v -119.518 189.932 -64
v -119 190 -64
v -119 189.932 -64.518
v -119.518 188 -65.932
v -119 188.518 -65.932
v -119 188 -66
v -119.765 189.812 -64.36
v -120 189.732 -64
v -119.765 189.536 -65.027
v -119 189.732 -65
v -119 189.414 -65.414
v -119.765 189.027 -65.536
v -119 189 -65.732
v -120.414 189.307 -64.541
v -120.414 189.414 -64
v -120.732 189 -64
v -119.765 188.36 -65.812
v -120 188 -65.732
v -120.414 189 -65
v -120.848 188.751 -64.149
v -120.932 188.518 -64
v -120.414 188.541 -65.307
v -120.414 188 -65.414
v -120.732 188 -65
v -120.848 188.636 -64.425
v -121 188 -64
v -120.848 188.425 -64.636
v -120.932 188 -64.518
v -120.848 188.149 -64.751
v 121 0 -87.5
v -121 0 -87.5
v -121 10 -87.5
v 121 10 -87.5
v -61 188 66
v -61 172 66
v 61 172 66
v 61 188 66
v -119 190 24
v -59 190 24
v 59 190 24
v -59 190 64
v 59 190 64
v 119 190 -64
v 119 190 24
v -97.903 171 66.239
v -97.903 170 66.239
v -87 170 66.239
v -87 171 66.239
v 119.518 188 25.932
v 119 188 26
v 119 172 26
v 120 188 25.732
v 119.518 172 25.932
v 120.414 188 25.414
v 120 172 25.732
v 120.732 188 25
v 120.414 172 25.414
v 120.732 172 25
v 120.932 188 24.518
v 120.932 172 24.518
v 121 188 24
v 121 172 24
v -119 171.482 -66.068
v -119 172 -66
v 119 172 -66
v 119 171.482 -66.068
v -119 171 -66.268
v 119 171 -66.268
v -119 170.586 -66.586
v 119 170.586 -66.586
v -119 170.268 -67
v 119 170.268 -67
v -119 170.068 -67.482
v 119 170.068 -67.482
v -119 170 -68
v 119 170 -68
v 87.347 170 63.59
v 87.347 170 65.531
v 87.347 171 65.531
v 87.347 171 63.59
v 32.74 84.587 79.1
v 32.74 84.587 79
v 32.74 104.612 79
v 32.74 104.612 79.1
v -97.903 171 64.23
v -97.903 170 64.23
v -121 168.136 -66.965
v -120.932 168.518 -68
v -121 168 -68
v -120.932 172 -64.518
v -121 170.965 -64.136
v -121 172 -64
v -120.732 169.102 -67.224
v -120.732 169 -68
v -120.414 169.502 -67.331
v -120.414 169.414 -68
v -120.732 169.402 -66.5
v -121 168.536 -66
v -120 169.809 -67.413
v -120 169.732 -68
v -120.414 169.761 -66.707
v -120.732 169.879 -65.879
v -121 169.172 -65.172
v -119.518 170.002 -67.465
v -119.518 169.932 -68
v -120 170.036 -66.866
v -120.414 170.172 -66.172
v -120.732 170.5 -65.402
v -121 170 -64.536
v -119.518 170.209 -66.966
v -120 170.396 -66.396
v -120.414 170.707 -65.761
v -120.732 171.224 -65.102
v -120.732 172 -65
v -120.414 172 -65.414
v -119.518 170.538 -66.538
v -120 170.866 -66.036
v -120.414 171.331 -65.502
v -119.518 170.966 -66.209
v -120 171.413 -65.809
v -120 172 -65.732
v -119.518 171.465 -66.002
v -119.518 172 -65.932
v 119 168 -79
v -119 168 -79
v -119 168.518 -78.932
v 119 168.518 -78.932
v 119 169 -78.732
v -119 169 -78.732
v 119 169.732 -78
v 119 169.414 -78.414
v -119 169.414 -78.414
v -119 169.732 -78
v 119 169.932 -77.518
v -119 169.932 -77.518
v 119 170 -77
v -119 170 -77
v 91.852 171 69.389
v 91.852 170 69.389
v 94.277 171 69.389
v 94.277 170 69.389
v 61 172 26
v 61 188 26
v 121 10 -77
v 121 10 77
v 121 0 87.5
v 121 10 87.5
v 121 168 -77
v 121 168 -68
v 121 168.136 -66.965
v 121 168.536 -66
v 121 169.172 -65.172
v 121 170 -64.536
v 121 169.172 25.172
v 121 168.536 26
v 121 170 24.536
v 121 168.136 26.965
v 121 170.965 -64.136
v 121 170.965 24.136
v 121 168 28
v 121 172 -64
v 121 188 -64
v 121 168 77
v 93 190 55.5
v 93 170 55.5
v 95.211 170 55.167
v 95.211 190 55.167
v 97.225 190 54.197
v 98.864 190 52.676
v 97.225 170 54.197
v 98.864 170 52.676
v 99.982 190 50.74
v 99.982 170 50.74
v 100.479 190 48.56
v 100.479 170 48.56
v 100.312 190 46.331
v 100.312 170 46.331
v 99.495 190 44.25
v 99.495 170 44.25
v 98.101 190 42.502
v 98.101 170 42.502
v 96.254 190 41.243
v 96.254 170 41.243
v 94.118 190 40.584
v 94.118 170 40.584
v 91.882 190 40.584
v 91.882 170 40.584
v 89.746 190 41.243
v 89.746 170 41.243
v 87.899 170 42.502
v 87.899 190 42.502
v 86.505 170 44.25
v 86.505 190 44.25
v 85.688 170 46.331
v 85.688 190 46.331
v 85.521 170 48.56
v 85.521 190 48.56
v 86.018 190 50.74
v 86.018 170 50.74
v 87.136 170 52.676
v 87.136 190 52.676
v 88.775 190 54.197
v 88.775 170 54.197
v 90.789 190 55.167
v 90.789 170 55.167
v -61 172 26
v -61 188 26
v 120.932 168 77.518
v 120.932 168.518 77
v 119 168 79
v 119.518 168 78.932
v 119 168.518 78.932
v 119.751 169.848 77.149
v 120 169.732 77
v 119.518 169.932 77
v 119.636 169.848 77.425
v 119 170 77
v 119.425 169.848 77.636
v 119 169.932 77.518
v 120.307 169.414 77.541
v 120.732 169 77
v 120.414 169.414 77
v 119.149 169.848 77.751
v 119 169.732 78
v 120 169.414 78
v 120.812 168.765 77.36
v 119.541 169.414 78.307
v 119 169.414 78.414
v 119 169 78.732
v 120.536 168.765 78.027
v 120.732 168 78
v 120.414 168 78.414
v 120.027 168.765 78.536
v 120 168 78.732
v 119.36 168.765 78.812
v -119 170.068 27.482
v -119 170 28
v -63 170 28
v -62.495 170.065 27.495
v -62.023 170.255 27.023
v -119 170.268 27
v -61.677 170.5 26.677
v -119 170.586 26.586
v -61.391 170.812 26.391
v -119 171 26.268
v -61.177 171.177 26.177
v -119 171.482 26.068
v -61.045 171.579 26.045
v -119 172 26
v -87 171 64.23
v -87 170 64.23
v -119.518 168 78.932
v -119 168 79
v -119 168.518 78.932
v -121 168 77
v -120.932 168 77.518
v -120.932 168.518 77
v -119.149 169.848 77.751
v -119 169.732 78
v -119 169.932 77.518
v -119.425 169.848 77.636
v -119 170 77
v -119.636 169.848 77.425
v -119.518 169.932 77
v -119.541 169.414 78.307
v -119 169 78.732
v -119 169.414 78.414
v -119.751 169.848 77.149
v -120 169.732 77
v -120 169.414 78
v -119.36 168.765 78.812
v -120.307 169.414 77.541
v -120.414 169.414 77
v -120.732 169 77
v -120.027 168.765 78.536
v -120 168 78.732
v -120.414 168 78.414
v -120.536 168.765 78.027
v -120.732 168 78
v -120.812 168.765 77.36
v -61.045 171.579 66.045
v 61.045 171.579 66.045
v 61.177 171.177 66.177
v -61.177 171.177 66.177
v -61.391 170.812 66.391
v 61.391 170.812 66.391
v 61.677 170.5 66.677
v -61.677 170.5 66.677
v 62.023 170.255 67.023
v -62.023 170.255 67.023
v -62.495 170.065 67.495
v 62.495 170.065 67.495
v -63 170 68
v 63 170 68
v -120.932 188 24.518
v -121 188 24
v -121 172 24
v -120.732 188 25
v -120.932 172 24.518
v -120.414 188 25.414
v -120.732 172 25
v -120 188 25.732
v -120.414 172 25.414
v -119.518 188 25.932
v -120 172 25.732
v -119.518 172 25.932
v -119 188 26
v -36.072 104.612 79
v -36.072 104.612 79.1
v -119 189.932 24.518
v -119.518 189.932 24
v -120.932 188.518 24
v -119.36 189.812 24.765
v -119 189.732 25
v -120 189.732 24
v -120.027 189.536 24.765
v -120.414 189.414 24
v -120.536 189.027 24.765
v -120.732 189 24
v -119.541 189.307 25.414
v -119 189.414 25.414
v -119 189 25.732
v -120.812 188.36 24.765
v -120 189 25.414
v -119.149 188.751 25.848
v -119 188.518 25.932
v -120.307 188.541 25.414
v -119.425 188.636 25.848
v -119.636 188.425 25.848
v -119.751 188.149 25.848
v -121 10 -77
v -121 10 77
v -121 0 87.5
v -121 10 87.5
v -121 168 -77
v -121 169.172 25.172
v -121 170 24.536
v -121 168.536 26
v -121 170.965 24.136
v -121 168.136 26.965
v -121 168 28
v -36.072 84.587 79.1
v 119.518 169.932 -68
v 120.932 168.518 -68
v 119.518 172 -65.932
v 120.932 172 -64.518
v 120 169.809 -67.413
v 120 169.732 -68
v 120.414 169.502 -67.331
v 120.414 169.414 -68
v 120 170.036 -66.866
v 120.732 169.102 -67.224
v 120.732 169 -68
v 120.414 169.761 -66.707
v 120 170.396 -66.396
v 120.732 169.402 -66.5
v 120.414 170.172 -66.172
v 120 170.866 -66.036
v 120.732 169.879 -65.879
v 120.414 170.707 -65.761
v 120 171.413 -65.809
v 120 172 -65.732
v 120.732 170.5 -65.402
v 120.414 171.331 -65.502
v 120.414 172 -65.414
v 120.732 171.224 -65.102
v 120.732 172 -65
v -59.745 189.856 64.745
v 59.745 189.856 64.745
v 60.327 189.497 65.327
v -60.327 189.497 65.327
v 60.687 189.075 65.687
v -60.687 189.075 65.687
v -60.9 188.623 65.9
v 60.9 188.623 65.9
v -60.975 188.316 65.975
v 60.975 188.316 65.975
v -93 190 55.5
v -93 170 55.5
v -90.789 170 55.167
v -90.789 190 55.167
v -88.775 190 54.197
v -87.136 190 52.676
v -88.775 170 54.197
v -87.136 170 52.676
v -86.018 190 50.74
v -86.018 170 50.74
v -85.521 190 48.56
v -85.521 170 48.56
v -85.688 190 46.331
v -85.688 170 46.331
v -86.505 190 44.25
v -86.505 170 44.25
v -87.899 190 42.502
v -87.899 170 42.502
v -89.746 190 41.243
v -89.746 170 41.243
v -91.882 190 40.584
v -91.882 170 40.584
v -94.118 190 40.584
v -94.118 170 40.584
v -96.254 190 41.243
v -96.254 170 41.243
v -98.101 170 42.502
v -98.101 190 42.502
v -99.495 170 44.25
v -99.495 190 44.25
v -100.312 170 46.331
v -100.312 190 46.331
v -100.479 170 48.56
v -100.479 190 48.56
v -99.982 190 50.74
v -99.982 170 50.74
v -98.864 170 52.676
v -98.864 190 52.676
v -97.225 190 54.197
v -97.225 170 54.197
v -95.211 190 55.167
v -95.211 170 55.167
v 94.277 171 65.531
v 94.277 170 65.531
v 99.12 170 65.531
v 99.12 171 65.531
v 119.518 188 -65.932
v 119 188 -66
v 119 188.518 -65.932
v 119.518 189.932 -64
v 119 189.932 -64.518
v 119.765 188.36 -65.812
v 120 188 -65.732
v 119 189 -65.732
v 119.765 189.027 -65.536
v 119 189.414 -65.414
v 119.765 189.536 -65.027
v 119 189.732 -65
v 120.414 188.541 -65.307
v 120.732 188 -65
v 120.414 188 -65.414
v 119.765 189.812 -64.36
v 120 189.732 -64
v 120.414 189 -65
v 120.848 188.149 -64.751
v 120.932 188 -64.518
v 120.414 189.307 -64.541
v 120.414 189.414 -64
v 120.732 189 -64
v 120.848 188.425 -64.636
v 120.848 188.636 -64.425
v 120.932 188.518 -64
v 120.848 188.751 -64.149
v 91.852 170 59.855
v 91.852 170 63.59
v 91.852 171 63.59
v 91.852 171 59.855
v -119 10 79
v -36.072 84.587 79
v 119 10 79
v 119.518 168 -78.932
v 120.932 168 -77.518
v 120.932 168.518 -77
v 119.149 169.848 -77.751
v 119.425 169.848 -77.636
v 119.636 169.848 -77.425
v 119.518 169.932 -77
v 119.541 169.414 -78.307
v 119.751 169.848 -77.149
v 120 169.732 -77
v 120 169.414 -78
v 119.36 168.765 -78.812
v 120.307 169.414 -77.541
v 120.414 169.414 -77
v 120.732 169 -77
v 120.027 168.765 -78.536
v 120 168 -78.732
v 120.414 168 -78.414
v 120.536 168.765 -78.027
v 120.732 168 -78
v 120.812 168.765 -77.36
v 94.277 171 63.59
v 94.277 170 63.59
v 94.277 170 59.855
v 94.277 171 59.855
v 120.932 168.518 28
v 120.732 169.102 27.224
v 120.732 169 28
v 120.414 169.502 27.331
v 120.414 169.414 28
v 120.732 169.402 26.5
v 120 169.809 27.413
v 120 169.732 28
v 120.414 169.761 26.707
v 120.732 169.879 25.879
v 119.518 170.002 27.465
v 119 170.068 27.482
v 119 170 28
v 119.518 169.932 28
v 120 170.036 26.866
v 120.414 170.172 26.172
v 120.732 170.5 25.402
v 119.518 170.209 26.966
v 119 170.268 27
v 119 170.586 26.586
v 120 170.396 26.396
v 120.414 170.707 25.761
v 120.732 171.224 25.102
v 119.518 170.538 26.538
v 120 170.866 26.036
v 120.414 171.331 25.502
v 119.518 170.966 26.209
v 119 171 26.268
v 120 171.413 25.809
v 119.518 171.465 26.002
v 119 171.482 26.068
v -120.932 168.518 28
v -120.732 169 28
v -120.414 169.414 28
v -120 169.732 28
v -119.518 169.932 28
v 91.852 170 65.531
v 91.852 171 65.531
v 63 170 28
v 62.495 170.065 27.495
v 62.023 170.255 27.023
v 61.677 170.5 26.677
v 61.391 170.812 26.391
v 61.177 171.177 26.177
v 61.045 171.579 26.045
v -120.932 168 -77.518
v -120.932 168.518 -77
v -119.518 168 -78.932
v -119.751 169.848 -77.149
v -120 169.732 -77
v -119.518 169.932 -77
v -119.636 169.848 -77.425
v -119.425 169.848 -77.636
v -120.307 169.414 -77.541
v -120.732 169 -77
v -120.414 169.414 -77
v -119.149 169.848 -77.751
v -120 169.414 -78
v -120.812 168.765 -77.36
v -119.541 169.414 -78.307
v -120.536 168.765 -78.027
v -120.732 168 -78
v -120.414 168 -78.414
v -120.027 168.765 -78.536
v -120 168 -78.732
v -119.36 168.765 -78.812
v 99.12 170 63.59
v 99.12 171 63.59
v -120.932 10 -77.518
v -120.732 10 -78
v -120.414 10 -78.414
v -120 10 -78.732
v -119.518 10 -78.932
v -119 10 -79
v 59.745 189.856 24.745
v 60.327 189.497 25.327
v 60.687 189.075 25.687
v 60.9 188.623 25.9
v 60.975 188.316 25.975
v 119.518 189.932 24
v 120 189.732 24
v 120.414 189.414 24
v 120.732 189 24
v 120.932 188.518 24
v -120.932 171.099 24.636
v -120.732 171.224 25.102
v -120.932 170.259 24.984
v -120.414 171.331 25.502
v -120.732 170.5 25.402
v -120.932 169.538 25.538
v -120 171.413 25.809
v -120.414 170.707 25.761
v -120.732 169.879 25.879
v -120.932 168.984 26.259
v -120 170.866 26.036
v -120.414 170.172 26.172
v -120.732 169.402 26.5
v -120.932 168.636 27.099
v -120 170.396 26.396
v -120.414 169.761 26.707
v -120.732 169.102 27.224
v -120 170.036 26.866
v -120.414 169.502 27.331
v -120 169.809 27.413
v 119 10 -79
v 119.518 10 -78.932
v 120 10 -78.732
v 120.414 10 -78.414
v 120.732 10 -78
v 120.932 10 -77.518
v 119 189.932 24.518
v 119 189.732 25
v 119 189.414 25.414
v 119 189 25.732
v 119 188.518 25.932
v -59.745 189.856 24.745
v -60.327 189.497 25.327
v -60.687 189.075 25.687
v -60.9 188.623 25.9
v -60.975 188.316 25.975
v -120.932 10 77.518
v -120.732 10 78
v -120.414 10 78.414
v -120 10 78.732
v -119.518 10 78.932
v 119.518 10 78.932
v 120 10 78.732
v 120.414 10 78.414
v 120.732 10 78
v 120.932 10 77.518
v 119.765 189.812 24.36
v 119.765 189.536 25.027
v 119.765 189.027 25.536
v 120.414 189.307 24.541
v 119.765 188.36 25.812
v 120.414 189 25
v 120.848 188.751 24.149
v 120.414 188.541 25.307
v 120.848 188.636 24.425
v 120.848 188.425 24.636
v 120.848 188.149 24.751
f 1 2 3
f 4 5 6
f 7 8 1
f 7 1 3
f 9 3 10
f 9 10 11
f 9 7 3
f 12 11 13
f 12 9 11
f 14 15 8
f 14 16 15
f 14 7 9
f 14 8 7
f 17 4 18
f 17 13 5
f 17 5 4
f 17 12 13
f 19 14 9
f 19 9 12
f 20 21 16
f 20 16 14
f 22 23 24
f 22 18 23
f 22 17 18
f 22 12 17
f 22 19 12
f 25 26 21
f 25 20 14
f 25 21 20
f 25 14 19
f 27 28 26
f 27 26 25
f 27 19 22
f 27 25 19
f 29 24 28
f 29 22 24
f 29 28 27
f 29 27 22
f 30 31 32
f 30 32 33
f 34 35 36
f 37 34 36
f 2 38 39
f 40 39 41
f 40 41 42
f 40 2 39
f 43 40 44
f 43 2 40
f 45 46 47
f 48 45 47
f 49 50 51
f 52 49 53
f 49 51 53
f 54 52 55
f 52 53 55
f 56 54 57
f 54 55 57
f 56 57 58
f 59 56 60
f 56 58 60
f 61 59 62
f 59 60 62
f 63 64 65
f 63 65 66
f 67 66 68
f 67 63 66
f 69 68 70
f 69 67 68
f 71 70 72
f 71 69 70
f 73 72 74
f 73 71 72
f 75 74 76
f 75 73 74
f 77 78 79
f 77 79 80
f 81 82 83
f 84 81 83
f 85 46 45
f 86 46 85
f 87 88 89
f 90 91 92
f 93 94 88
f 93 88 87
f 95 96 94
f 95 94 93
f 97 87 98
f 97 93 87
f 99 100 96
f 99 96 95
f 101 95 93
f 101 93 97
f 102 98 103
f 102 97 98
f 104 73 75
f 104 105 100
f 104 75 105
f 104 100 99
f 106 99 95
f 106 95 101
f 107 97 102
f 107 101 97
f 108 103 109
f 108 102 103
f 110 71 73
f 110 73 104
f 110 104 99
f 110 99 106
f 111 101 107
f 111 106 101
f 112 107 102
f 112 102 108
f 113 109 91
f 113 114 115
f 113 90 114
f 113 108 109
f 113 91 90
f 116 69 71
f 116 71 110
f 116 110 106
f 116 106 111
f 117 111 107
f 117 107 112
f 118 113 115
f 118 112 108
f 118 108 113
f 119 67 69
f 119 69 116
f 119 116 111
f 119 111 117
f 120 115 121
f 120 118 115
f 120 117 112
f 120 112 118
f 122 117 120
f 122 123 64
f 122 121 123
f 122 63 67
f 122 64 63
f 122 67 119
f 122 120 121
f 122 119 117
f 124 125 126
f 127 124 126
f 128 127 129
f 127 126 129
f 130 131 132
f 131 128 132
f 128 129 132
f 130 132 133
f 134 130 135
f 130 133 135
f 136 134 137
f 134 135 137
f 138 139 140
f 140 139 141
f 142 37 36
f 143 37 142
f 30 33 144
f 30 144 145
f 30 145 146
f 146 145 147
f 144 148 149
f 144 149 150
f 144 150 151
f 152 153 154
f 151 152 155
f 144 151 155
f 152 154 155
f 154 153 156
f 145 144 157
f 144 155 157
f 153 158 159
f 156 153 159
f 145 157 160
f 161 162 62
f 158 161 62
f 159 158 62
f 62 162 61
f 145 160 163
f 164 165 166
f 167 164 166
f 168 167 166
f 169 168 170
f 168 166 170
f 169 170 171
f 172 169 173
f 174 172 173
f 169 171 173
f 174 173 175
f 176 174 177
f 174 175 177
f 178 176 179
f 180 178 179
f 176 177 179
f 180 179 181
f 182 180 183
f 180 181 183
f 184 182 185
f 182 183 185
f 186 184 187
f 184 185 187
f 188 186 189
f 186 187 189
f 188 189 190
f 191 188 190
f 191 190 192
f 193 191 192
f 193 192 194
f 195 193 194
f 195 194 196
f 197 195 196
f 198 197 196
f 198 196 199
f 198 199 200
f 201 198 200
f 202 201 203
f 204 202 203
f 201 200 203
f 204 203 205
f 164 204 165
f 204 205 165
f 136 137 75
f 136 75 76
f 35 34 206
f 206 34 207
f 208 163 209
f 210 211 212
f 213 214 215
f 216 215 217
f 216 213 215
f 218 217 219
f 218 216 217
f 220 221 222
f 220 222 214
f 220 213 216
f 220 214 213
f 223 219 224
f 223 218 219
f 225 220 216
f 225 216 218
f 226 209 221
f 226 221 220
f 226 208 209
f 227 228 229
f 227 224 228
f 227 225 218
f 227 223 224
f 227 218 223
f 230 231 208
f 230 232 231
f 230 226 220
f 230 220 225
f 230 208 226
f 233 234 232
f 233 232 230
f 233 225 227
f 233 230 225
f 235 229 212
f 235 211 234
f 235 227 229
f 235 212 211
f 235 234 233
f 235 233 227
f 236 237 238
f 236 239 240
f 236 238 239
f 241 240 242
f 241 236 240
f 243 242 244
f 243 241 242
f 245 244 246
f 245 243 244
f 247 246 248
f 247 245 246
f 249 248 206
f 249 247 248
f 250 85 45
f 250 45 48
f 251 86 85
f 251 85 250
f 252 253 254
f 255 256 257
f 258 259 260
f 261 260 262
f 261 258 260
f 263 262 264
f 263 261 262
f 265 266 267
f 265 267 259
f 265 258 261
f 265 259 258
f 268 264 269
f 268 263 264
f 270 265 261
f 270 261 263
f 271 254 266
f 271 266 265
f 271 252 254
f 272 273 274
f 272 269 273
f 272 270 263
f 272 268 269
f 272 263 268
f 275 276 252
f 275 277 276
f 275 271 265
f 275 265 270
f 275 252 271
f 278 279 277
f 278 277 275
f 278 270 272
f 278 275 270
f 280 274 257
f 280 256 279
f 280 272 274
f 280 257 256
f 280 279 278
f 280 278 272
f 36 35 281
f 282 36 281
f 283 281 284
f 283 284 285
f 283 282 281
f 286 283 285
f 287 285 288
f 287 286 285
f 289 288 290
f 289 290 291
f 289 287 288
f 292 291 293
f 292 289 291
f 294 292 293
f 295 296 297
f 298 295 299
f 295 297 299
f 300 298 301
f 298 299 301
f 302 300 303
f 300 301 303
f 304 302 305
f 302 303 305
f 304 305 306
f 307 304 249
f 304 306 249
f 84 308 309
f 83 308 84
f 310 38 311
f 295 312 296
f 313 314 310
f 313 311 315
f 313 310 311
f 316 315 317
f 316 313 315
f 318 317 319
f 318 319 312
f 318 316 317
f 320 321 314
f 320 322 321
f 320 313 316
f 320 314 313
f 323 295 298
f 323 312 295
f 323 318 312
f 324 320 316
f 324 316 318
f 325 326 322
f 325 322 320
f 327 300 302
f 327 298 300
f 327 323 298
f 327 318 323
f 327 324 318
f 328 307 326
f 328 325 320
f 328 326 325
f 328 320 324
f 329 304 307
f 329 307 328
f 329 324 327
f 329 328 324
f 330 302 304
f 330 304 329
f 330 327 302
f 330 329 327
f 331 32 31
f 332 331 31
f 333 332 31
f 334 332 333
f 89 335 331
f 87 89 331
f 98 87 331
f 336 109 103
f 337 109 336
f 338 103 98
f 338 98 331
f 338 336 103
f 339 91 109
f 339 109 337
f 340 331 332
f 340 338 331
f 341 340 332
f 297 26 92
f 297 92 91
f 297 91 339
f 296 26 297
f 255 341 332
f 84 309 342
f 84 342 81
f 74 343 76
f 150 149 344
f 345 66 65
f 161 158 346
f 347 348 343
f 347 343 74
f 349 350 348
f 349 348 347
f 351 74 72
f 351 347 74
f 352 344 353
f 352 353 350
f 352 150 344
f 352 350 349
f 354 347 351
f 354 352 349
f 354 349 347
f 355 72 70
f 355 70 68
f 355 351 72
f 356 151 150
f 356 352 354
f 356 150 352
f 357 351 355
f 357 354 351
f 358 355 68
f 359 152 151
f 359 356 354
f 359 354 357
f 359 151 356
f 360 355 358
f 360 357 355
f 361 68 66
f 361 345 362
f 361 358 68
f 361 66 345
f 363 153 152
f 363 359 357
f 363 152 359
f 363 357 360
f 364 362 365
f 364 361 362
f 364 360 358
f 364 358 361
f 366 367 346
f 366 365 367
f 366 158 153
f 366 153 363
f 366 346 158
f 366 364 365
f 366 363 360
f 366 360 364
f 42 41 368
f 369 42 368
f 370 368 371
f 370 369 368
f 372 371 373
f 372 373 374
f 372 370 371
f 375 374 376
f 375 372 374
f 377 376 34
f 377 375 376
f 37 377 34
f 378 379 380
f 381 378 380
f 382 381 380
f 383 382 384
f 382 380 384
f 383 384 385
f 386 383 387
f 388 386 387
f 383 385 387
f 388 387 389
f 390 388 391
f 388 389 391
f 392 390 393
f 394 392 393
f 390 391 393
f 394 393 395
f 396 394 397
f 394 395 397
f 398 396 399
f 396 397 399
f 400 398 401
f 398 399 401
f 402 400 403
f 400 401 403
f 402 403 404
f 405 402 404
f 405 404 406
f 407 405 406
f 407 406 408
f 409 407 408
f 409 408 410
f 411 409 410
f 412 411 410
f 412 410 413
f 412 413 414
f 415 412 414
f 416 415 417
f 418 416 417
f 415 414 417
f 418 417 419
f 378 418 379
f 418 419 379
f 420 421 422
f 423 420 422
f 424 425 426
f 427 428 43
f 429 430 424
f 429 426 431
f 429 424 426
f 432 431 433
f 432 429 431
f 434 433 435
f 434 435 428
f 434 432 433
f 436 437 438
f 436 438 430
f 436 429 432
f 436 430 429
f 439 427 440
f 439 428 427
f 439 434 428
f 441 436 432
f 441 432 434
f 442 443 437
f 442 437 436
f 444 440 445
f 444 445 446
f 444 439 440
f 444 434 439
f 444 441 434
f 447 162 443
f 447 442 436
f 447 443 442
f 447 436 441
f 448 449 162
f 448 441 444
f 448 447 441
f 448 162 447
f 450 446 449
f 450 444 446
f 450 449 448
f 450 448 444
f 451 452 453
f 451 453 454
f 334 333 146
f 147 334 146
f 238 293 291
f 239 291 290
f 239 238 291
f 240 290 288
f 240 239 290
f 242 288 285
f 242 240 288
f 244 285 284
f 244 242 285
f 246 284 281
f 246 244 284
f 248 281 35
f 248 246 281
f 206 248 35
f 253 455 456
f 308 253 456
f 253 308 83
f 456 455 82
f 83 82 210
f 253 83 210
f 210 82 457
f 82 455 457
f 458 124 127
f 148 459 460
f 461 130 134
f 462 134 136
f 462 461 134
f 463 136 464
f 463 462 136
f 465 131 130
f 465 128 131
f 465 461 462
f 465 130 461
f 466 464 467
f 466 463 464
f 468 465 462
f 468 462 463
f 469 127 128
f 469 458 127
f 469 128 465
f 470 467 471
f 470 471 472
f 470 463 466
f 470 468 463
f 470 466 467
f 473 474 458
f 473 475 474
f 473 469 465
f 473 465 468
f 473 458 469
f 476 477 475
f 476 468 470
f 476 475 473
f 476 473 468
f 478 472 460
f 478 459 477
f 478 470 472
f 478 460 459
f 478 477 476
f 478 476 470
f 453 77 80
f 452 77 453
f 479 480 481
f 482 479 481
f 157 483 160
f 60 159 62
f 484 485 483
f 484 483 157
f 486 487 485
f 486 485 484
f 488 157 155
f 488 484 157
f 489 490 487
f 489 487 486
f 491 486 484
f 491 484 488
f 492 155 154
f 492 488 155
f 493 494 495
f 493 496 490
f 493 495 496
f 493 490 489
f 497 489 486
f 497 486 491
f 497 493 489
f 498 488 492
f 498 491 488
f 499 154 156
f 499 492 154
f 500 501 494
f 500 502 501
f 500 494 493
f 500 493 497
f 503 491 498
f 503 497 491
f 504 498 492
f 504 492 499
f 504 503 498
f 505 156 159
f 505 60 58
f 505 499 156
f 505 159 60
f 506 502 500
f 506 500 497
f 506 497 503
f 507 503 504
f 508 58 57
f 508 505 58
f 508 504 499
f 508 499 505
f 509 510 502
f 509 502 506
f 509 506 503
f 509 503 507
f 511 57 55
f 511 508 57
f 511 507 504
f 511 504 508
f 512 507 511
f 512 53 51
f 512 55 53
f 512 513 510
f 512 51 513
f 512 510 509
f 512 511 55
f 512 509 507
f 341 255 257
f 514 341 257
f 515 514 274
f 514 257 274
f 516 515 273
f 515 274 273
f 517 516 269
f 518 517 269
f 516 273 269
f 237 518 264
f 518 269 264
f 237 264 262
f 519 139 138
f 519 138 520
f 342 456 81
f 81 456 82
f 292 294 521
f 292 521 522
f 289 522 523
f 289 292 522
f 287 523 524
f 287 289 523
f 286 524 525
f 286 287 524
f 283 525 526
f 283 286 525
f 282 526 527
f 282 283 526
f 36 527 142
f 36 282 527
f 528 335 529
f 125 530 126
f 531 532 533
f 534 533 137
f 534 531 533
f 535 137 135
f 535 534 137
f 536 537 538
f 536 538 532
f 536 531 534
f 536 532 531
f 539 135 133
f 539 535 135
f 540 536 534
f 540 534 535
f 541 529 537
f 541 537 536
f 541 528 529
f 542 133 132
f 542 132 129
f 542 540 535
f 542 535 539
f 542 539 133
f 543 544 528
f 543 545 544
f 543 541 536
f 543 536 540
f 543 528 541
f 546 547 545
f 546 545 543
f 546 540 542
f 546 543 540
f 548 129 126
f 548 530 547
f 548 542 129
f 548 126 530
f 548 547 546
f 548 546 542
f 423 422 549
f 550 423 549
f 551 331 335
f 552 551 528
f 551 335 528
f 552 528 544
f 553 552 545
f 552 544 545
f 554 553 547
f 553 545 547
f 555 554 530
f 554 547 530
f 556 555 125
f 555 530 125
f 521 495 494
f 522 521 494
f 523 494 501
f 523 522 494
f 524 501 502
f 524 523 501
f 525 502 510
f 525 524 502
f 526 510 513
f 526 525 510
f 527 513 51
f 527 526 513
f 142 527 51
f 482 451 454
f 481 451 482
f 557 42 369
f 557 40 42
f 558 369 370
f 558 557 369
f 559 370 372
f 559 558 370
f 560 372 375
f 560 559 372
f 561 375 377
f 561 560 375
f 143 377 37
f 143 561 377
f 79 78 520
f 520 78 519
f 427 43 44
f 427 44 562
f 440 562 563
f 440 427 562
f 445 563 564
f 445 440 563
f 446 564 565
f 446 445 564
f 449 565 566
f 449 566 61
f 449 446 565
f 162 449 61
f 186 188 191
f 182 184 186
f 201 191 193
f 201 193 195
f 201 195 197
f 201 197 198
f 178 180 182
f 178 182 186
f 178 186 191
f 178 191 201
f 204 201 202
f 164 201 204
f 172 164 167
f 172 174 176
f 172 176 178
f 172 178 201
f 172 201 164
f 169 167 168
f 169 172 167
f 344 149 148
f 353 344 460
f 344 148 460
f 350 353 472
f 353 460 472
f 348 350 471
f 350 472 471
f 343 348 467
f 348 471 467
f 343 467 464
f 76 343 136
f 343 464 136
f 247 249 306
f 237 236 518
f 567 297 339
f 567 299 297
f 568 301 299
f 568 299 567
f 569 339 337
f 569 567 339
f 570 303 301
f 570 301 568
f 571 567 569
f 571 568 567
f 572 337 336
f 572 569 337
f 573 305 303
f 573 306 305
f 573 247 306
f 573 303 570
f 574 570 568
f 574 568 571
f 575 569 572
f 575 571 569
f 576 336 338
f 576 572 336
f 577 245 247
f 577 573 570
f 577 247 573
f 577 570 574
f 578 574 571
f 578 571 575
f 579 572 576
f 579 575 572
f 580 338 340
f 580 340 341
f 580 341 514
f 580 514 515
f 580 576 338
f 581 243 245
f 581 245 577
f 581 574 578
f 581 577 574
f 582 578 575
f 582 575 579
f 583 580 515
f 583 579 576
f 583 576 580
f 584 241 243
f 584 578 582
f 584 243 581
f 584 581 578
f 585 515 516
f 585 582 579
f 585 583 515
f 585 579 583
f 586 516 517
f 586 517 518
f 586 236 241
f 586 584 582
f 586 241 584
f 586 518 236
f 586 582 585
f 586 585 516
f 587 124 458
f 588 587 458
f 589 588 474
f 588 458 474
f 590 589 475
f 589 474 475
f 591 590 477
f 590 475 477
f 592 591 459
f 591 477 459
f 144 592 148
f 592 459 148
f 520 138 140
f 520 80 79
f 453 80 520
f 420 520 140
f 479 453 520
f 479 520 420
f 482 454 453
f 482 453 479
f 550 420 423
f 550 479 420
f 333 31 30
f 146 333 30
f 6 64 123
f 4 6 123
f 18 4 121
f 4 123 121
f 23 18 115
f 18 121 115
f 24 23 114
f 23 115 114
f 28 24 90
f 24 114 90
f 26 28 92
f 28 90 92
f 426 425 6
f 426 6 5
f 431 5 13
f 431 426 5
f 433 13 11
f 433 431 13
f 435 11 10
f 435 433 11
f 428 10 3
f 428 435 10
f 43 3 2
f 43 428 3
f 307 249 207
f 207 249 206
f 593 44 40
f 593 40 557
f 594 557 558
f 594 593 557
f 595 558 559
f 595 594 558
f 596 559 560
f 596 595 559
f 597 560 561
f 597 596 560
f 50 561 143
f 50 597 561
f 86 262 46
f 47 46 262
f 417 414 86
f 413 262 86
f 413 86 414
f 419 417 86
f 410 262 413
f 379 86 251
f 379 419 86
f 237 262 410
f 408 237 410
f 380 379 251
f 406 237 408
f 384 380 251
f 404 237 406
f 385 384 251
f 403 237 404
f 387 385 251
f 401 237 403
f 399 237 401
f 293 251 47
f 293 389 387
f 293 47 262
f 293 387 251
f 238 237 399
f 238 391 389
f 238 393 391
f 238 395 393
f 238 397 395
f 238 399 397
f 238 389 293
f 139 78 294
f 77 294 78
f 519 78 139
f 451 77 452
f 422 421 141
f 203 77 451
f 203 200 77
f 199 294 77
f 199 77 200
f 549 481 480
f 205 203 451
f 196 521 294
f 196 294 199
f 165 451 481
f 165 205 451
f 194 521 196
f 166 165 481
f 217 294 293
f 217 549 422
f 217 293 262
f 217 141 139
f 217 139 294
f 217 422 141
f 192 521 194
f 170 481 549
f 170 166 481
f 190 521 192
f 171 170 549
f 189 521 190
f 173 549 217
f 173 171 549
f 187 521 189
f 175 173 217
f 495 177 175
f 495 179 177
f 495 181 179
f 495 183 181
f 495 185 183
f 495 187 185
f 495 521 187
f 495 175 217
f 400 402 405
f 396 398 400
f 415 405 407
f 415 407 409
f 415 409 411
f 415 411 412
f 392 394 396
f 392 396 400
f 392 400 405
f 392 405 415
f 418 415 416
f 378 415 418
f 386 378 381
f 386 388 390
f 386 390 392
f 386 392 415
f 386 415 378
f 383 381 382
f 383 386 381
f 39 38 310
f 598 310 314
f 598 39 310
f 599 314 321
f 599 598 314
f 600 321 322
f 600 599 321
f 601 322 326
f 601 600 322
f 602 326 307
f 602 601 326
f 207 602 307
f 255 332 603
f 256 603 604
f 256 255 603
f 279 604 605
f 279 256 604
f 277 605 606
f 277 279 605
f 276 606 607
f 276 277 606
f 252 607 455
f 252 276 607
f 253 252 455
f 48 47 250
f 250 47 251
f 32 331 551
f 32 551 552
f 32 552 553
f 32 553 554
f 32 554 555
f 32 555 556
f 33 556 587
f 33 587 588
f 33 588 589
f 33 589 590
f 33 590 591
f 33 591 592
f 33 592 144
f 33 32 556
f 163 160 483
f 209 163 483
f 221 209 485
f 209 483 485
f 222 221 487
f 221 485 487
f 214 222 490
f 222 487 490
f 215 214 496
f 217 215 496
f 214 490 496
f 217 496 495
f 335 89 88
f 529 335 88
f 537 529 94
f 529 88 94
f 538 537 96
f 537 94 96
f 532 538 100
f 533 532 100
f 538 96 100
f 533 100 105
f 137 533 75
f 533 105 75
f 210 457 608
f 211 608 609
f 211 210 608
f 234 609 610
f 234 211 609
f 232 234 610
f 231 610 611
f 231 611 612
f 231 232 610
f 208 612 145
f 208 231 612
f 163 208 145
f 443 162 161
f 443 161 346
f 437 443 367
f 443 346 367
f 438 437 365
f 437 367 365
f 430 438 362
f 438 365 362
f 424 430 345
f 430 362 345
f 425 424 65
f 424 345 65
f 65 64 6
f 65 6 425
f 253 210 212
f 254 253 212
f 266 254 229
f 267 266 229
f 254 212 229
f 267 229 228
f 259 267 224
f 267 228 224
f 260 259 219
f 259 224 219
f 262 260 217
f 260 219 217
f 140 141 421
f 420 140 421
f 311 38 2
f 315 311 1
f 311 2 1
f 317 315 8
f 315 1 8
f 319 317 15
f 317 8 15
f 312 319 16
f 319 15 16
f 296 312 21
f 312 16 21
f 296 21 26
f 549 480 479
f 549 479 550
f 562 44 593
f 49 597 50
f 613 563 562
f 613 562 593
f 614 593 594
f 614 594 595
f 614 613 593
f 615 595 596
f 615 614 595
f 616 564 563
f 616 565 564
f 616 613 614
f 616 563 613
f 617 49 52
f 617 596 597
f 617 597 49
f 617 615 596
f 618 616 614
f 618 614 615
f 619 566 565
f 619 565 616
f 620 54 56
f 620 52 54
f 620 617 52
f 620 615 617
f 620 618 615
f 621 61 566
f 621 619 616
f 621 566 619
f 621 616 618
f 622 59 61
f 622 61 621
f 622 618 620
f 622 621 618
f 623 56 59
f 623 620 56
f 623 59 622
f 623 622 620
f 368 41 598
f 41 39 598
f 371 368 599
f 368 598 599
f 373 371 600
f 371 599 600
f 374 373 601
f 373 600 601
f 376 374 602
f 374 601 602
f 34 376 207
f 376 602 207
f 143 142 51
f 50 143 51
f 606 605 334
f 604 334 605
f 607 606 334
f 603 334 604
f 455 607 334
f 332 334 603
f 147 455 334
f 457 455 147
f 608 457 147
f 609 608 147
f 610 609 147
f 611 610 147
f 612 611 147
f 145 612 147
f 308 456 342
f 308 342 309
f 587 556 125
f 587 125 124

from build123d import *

# Parameters (mm, degrees)
SKETCH_1_W          = 242
SKETCH_1_H          = 175
EXTRUDE_1_DEPTH     = 10
SKETCH_2_W          = 242
SKETCH_2_H          = 158
EXTRUDE_2_DEPTH     = 160
SKETCH_3_W          = 242
SKETCH_3_H          = 132
EXTRUDE_3_DEPTH     = 20
SKETCH_4_W          = 60
SKETCH_4_H          = 40
CUT_EXTRUDE_1_DEPTH = 20
SKETCH_5_W          = 60
SKETCH_5_H          = 40
CUT_EXTRUDE_2_DEPTH = 20
FILLET_2_R          = 2
FILLET_3_R          = 2
FILLET_4_R          = 2
FILLET_5_R          = 2
FILLET_6_R          = 2
FILLET_7_R          = 2
FILLET_8_R          = 2
SKETCH_6_R          = 7.5
EXTRUDE_4_DEPTH     = 20
SKETCH_7_R          = 7.5
EXTRUDE_5_DEPTH     = 20
SKETCH_9_W          = 10.902570875
SKETCH_9_H          = 2.008368319
EXTRUDE_6_DEPTH     = 1
SKETCH_10_W         = 11.773146019
SKETCH_10_H         = 1.940628464
EXTRUDE_7_DEPTH     = 1
SKETCH_11_W         = 2.42536198
SKETCH_11_H         = 9.534181576
EXTRUDE_8_DEPTH     = 1
SKETCH_12_W         = 68.811606865
SKETCH_12_H         = 20.02454168
EXTRUDE_9_DEPTH     = 0.1


with BuildPart() as part:
    # 草图1 → 凸台-拉伸1 (new body)
    with BuildSketch(Plane(origin=(0, 0, 0), x_dir=(1, 0, 0), z_dir=(0, 1, 0))):
        Rectangle(SKETCH_1_W, SKETCH_1_H)
    extrude(amount=EXTRUDE_1_DEPTH)

    # 草图2 → 凸台-拉伸2 (add)
    with BuildSketch(Plane(origin=(0, 10, 0), x_dir=(1, 0, 0), z_dir=(0, 1, 0))):
        Rectangle(SKETCH_2_W, SKETCH_2_H)
    extrude(amount=EXTRUDE_2_DEPTH)

    # 草图3 → 凸台-拉伸3 (add)
    with BuildSketch(Plane(origin=(0, 170, 0), x_dir=(1, 0, 0), z_dir=(0, 1, 0))):
        Rectangle(SKETCH_3_W, SKETCH_3_H)
    extrude(amount=EXTRUDE_3_DEPTH)

    # 草图4 → 切除-拉伸1 (cut)
    with BuildSketch(Plane(origin=(0, 170, 0), x_dir=(1, 0, 0), z_dir=(0, 1, 0))):
        with Locations((-91, -46)):
            Rectangle(SKETCH_4_W, SKETCH_4_H)
    extrude(amount=CUT_EXTRUDE_1_DEPTH, mode=Mode.SUBTRACT)

    # 草图5 → 切除-拉伸2 (cut)
    with BuildSketch(Plane(origin=(0, 170, 0), x_dir=(1, 0, 0), z_dir=(0, 1, 0))):
        with Locations((91, -46)):
            Rectangle(SKETCH_5_W, SKETCH_5_H)
    extrude(amount=CUT_EXTRUDE_2_DEPTH, mode=Mode.SUBTRACT)

    # 圆角2
    fillet_2_edges = [part.edges().sort_by_distance(p)[0] for p in [
        (-121, 90, 79),
    ]]
    fillet(fillet_2_edges, radius=FILLET_2_R)

    # 圆角3
    fillet_3_edges = [part.edges().sort_by_distance(p)[0] for p in [
        (121, 90, 79),
    ]]
    fillet(fillet_3_edges, radius=FILLET_3_R)

    # 圆角4
    fillet_4_edges = [part.edges().sort_by_distance(p)[0] for p in [
        (121, 90, -79),
    ]]
    fillet(fillet_4_edges, radius=FILLET_4_R)

    # 圆角5
    fillet_5_edges = [part.edges().sort_by_distance(p)[0] for p in [
        (-121, 90, -79),
    ]]
    fillet(fillet_5_edges, radius=FILLET_5_R)

    # 圆角6
    fillet_6_edges = [part.edges().sort_by_distance(p)[0] for p in [
        (-61, 190, 46),
        (-91, 190, 26),
        (-121, 190, -20),
        (0, 190, -66),
        (121, 190, -20),
        (91, 190, 26),
        (61, 190, 46),
        (0, 190, 66),
    ]]
    fillet(fillet_6_edges, radius=FILLET_6_R)

    # 圆角7
    # the kernel refuses this fillet: 2 mm, written as the material it adds along each edge
    with BuildSketch(Plane(origin=(61, 170, 66), x_dir=(0, 0, 1), z_dir=(-1, 0, 0))) as fillet_7_piece_1:
        with BuildLine():
            CenterArc((FILLET_7_R, FILLET_7_R), FILLET_7_R, 180, 90)
            Line((0, FILLET_7_R), (0, 0))
            Line((0, 0), (FILLET_7_R, 0))
        make_face()
    extrude(amount=122)
    with BuildSketch(Plane(origin=(-121, 170, 26), x_dir=(0, 1, 0), z_dir=(1, 0, 0))) as fillet_7_piece_2:
        with BuildLine():
            CenterArc((FILLET_7_R, FILLET_7_R), FILLET_7_R, 180, 90)
            Line((0, FILLET_7_R), (0, 0))
            Line((0, 0), (FILLET_7_R, 0))
        make_face()
    extrude(amount=65)
    with BuildSketch(Plane(origin=(-61, 170, 21), x_dir=(-1, 0, 0), z_dir=(0, 0, 1)), Plane(origin=(61, 170, 66), x_dir=(1, 0, 0), z_dir=(0, 0, -1))) as fillet_7_piece_3:
        with BuildLine():
            CenterArc((FILLET_7_R, -FILLET_7_R), FILLET_7_R, 90, 90)
            Line((0, -FILLET_7_R), (0, 0))
            Line((0, 0), (FILLET_7_R, 0))
        make_face()
    extrude(amount=45)
    with BuildSketch(Plane(origin=(56, 170, 26), x_dir=(0, 0, 1), z_dir=(1, 0, 0))) as fillet_7_piece_4:
        with BuildLine():
            CenterArc((FILLET_7_R, -FILLET_7_R), FILLET_7_R, 90, 90)
            Line((0, -FILLET_7_R), (0, 0))
            Line((0, 0), (FILLET_7_R, 0))
        make_face()
    extrude(amount=65)
    with BuildSketch(Plane(origin=(61, 170, 71), x_dir=(1, 0, 0), z_dir=(0, 0, -1))) as fillet_7_piece_5a_section:
        with BuildLine():
            CenterArc((FILLET_7_R, -FILLET_7_R), FILLET_7_R, 90, 90)
            Line((0, -FILLET_7_R), (0, 0))
            Line((0, 0), (FILLET_7_R, 0))
        make_face()
    fillet_7_piece_5a = extrude(amount=45, mode=Mode.PRIVATE)
    fillet_7_piece_5a = split(fillet_7_piece_5a, bisect_by=Plane(origin=(61.452790229, 170.452790229, 66), z_dir=(0, 0, 1)), keep=Keep.TOP, mode=Mode.PRIVATE)
    with BuildSketch(Plane(origin=(66, 170, 66), x_dir=(0, 0, 1), z_dir=(-1, 0, 0))) as fillet_7_piece_5b_section:
        with BuildLine():
            CenterArc((FILLET_7_R, FILLET_7_R), FILLET_7_R, 180, 90)
            Line((0, FILLET_7_R), (0, 0))
            Line((0, 0), (FILLET_7_R, 0))
        make_face()
    fillet_7_piece_5b = extrude(amount=127, mode=Mode.PRIVATE)
    fillet_7_piece_5b = split(fillet_7_piece_5b, bisect_by=Plane(origin=(61, 170.452790229, 66.452790229), z_dir=(1, 0, 0)), keep=Keep.TOP, mode=Mode.PRIVATE)
    fillet_7_piece_5 = fillet_7_piece_5a & fillet_7_piece_5b
    add(fillet_7_piece_5)
    with BuildSketch(Plane(origin=(-61, 170, 26), x_dir=(-1, 0, 0), z_dir=(0, 0, 1))) as fillet_7_piece_6a_section:
        with BuildLine():
            CenterArc((FILLET_7_R, -FILLET_7_R), FILLET_7_R, 90, 90)
            Line((0, -FILLET_7_R), (0, 0))
            Line((0, 0), (FILLET_7_R, 0))
        make_face()
    fillet_7_piece_6a = extrude(amount=45, mode=Mode.PRIVATE)
    fillet_7_piece_6a = split(fillet_7_piece_6a, bisect_by=Plane(origin=(-61.452790229, 170.452790229, 66), z_dir=(0, 0, 1)), keep=Keep.TOP, mode=Mode.PRIVATE)
    with BuildSketch(Plane(origin=(61, 170, 66), x_dir=(0, 0, 1), z_dir=(-1, 0, 0))) as fillet_7_piece_6b_section:
        with BuildLine():
            CenterArc((FILLET_7_R, FILLET_7_R), FILLET_7_R, 180, 90)
            Line((0, FILLET_7_R), (0, 0))
            Line((0, 0), (FILLET_7_R, 0))
        make_face()
    fillet_7_piece_6b = extrude(amount=127, mode=Mode.PRIVATE)
    fillet_7_piece_6b = split(fillet_7_piece_6b, bisect_by=Plane(origin=(-61, 170.452790229, 66.452790229), z_dir=(-1, 0, 0)), keep=Keep.TOP, mode=Mode.PRIVATE)
    fillet_7_piece_6 = fillet_7_piece_6a & fillet_7_piece_6b
    add(fillet_7_piece_6)
    # the kernel refuses this fillet: 2 mm, written as the material it takes off along each edge
    with BuildSketch(Plane(origin=(119, 188, 24), x_dir=(0, 0, 1), z_dir=(1, 0, 0))) as fillet_7_2_piece_1_section:
        Polygon((0, 0), (FILLET_7_R, 0), (FILLET_7_R, -FILLET_7_R), (0, -FILLET_7_R), align=None)
    fillet_7_2_piece_1 = extrude(amount=FILLET_7_R, mode=Mode.PRIVATE)
    fillet_7_2_piece_1 = fillet_7_2_piece_1 - Plane(origin=(119, 188, 24), x_dir=(0, -0.7071067811865475, -0.7071067811865475), z_dir=(1, 0, 0)) * Sphere(FILLET_7_R, mode=Mode.PRIVATE)
    add(fillet_7_2_piece_1, mode=Mode.SUBTRACT)
    with BuildSketch(Plane(origin=(-119, 188, 24), x_dir=(-1, 0, 0), z_dir=(0, 0, 1))) as fillet_7_2_piece_2_section:
        Polygon((0, 0), (FILLET_7_R, 0), (FILLET_7_R, -FILLET_7_R), (0, -FILLET_7_R), align=None)
    fillet_7_2_piece_2 = extrude(amount=FILLET_7_R, mode=Mode.PRIVATE)
    fillet_7_2_piece_2 = fillet_7_2_piece_2 - Plane(origin=(-119, 188, 24), x_dir=(0.7071067811865475, -0.7071067811865475, 0), z_dir=(0, 0, 1)) * Sphere(FILLET_7_R, mode=Mode.PRIVATE)
    add(fillet_7_2_piece_2, mode=Mode.SUBTRACT)
    with BuildSketch(Plane(origin=(-121, 172, 26), x_dir=(1, 0, 0), z_dir=(0, 1, 0)), Plane(origin=(121, 172, 26), x_dir=(0, 0, -1), z_dir=(0, 1, 0))) as fillet_7_2_piece_3:
        with BuildLine():
            CenterArc((FILLET_7_R, FILLET_7_R), FILLET_7_R, 180, 90)
            Line((0, FILLET_7_R), (0, 0))
            Line((0, 0), (FILLET_7_R, 0))
        make_face()
    extrude(amount=16, mode=Mode.SUBTRACT)
    with BuildSketch(Plane(origin=(-121, 170, 77), x_dir=(1, 0, 0), z_dir=(0, 0, -1))) as fillet_7_2_piece_4:
        with BuildLine():
            CenterArc((FILLET_7_R, FILLET_7_R), FILLET_7_R, 180, 90)
            Line((0, FILLET_7_R), (0, 0))
            Line((0, 0), (FILLET_7_R, 0))
        make_face()
    extrude(amount=49, mode=Mode.SUBTRACT)
    with BuildSketch(Plane(origin=(119, 170, 79), x_dir=(0, -1, 0), z_dir=(-1, 0, 0))) as fillet_7_2_piece_5:
        with BuildLine():
            CenterArc((FILLET_7_R, -FILLET_7_R), FILLET_7_R, 90, 90)
            Line((0, -FILLET_7_R), (0, 0))
            Line((0, 0), (FILLET_7_R, 0))
        make_face()
    extrude(amount=238, mode=Mode.SUBTRACT)
    with BuildSketch(Plane(origin=(-119, 170, 77), x_dir=(0, 0, 1), z_dir=(1, 0, 0))) as fillet_7_2_piece_6:
        with BuildLine():
            CenterArc((2 - FILLET_7_R, FILLET_7_R), FILLET_7_R, 270, 90)
            Line((2 - FILLET_7_R, 0), (2, 0))
            Line((2, 0), (2, FILLET_7_R))
        make_face()
    revolve(axis=Axis((-119, 170, 77), (0, -1, 0)), revolution_arc=90, mode=Mode.SUBTRACT)
    with BuildSketch(Plane(origin=(121, 170, 28), x_dir=(0, -1, 0), z_dir=(0, 0, 1))) as fillet_7_2_piece_7:
        with BuildLine():
            CenterArc((FILLET_7_R, -FILLET_7_R), FILLET_7_R, 90, 90)
            Line((0, -FILLET_7_R), (0, 0))
            Line((0, 0), (FILLET_7_R, 0))
        make_face()
    extrude(amount=49, mode=Mode.SUBTRACT)
    with BuildSketch(Plane(origin=(119, 170, 77), x_dir=(1, 0, 0), z_dir=(0, 0, -1))) as fillet_7_2_piece_8:
        with BuildLine():
            CenterArc((2 - FILLET_7_R, FILLET_7_R), FILLET_7_R, 270, 90)
            Line((2 - FILLET_7_R, 0), (2, 0))
            Line((2, 0), (2, FILLET_7_R))
        make_face()
    revolve(axis=Axis((119, 170, 77), (0, -1, 0)), revolution_arc=90, mode=Mode.SUBTRACT)
    with BuildSketch(Plane(origin=(121, 172, 28), x_dir=(0, -1, 0), z_dir=(0, 0, 1))) as fillet_7_2_piece_9:
        with BuildLine():
            CenterArc((2 + FILLET_7_R, -FILLET_7_R), FILLET_7_R, 90, 90)
            Line((2, -FILLET_7_R), (2, 0))
            Line((2, 0), (2 + FILLET_7_R, 0))
        make_face()
    revolve(axis=Axis((121, 172, 28), (1, 0, 0)), revolution_arc=90, mode=Mode.SUBTRACT)
    with BuildSketch(Plane(origin=(-121, 172, 28), x_dir=(0, 0, -1), z_dir=(0, 1, 0))) as fillet_7_2_piece_10:
        with BuildLine():
            CenterArc((2 + FILLET_7_R, -FILLET_7_R), FILLET_7_R, 90, 90)
            Line((2 + FILLET_7_R, 0), (2, 0))
            Line((2, 0), (2, -FILLET_7_R))
        make_face()
    revolve(axis=Axis((-121, 172, 28), (-1, 0, 0)), revolution_arc=90, mode=Mode.SUBTRACT)

    # 圆角8
    # the kernel refuses this fillet: 2 mm, written as the material it adds along each edge
    with BuildSketch(Plane(origin=(-121, 170, -66), x_dir=(0, 0, -1), z_dir=(1, 0, 0))) as fillet_8_piece_1:
        with BuildLine():
            CenterArc((FILLET_8_R, FILLET_8_R), FILLET_8_R, 180, 90)
            Line((0, FILLET_8_R), (0, 0))
            Line((0, 0), (FILLET_8_R, 0))
        make_face()
    extrude(amount=242)
    # the kernel refuses this fillet: 2 mm, written as the material it takes off along each edge
    with BuildSketch(Plane(origin=(119, 188, -64), x_dir=(0, 0, -1), z_dir=(1, 0, 0))) as fillet_8_2_piece_1_section:
        Polygon((0, 0), (FILLET_8_R, 0), (FILLET_8_R, FILLET_8_R), (0, FILLET_8_R), align=None)
    fillet_8_2_piece_1 = extrude(amount=FILLET_8_R, mode=Mode.PRIVATE)
    fillet_8_2_piece_1 = fillet_8_2_piece_1 - Plane(origin=(119, 188, -64), x_dir=(0, -0.7071067811865475, 0.7071067811865475), z_dir=(1, 0, 0)) * Sphere(FILLET_8_R, mode=Mode.PRIVATE)
    add(fillet_8_2_piece_1, mode=Mode.SUBTRACT)
    with BuildSketch(Plane(origin=(-119, 188, -64), x_dir=(0, 0, -1), z_dir=(-1, 0, 0))) as fillet_8_2_piece_2_section:
        Polygon((0, 0), (FILLET_8_R, 0), (FILLET_8_R, -FILLET_8_R), (0, -FILLET_8_R), align=None)
    fillet_8_2_piece_2 = extrude(amount=FILLET_8_R, mode=Mode.PRIVATE)
    fillet_8_2_piece_2 = fillet_8_2_piece_2 - Plane(origin=(-119, 188, -64), x_dir=(0, -0.7071067811865475, 0.7071067811865475), z_dir=(-1, 0, 0)) * Sphere(FILLET_8_R, mode=Mode.PRIVATE)
    add(fillet_8_2_piece_2, mode=Mode.SUBTRACT)
    with BuildSketch(Plane(origin=(119, 170, -77), x_dir=(0, 0, -1), z_dir=(-1, 0, 0))) as fillet_8_2_piece_3:
        with BuildLine():
            CenterArc((2 - FILLET_8_R, FILLET_8_R), FILLET_8_R, 270, 90)
            Line((2, FILLET_8_R), (2, 0))
            Line((2, 0), (2 - FILLET_8_R, 0))
        make_face()
    revolve(axis=Axis((119, 170, -77), (0, -1, 0)), revolution_arc=90, mode=Mode.SUBTRACT)
    with BuildSketch(Plane(origin=(-121, 170, -68), x_dir=(0, -1, 0), z_dir=(0, 0, -1)), Plane(origin=(121, 170, -77), x_dir=(0, -1, 0), z_dir=(0, 0, 1))) as fillet_8_2_piece_4:
        with BuildLine():
            CenterArc((FILLET_8_R, -FILLET_8_R), FILLET_8_R, 90, 90)
            Line((0, -FILLET_8_R), (0, 0))
            Line((0, 0), (FILLET_8_R, 0))
        make_face()
    extrude(amount=9, mode=Mode.SUBTRACT)
    with BuildSketch(Plane(origin=(-119, 170, -77), x_dir=(-1, 0, 0), z_dir=(0, 0, 1))) as fillet_8_2_piece_5:
        with BuildLine():
            CenterArc((2 - FILLET_8_R, FILLET_8_R), FILLET_8_R, 270, 90)
            Line((2 - FILLET_8_R, 0), (2, 0))
            Line((2, 0), (2, FILLET_8_R))
        make_face()
    revolve(axis=Axis((-119, 170, -77), (0, -1, 0)), revolution_arc=90, mode=Mode.SUBTRACT)
    with BuildSketch(Plane(origin=(-121, 172, -66), x_dir=(0, 0, 1), z_dir=(0, 1, 0))) as fillet_8_2_piece_6:
        with BuildLine():
            CenterArc((FILLET_8_R, FILLET_8_R), FILLET_8_R, 180, 90)
            Line((0, FILLET_8_R), (0, 0))
            Line((0, 0), (FILLET_8_R, 0))
        make_face()
    extrude(amount=16, mode=Mode.SUBTRACT)
    with BuildSketch(Plane(origin=(121, 172, -66), x_dir=(0, 0, 1), z_dir=(0, 1, 0))) as fillet_8_2_piece_7:
        with BuildLine():
            CenterArc((FILLET_8_R, -FILLET_8_R), FILLET_8_R, 90, 90)
            Line((0, -FILLET_8_R), (0, 0))
            Line((0, 0), (FILLET_8_R, 0))
        make_face()
    extrude(amount=16, mode=Mode.SUBTRACT)
    with BuildSketch(Plane(origin=(-119, 170, -79), x_dir=(0, 0, 1), z_dir=(1, 0, 0))) as fillet_8_2_piece_8:
        with BuildLine():
            CenterArc((FILLET_8_R, FILLET_8_R), FILLET_8_R, 180, 90)
            Line((0, FILLET_8_R), (0, 0))
            Line((0, 0), (FILLET_8_R, 0))
        make_face()
    extrude(amount=238, mode=Mode.SUBTRACT)
    with BuildSketch(Plane(origin=(121, 172, -68), x_dir=(0, -1, 0), z_dir=(0, 0, -1))) as fillet_8_2_piece_9:
        with BuildLine():
            CenterArc((2 + FILLET_8_R, FILLET_8_R), FILLET_8_R, 180, 90)
            Line((2, FILLET_8_R), (2, 0))
            Line((2, 0), (2 + FILLET_8_R, 0))
        make_face()
    revolve(axis=Axis((121, 172, -68), (-1, 0, 0)), revolution_arc=90, mode=Mode.SUBTRACT)
    with BuildSketch(Plane(origin=(-121, 172, -68), x_dir=(0, -1, 0), z_dir=(0, 0, -1))) as fillet_8_2_piece_10:
        with BuildLine():
            CenterArc((2 + FILLET_8_R, -FILLET_8_R), FILLET_8_R, 90, 90)
            Line((2, -FILLET_8_R), (2, 0))
            Line((2, 0), (2 + FILLET_8_R, 0))
        make_face()
    revolve(axis=Axis((-121, 172, -68), (-1, 0, 0)), revolution_arc=90, mode=Mode.SUBTRACT)

    # 草图6 → 凸台-拉伸4 (add)
    with BuildSketch(Plane(origin=(0, 170, 0), x_dir=(1, 0, 0), z_dir=(0, 1, 0))):
        with Locations(Location((-93, -48, 0), (0, 0, 270))):
            Circle(SKETCH_6_R)
    extrude(amount=EXTRUDE_4_DEPTH)

    # 草图7 → 凸台-拉伸5 (add)
    with BuildSketch(Plane(origin=(0, 170, 0), x_dir=(1, 0, 0), z_dir=(0, 1, 0))):
        with Locations(Location((93, -48, 0), (0, 0, 270))):
            Circle(SKETCH_7_R)
    extrude(amount=EXTRUDE_5_DEPTH)

    # 草图9 → 凸台-拉伸6 (add)
    with BuildSketch(Plane(origin=(0, 170, 0), x_dir=(1, 0, 0), z_dir=(0, 1, 0))):
        with Locations((-92.451285438, -65.23464498)):
            Rectangle(SKETCH_9_W, SKETCH_9_H)
    extrude(amount=EXTRUDE_6_DEPTH)

    # 草图10 → 凸台-拉伸7 (add)
    with BuildSketch(Plane(origin=(0, 170, 0), x_dir=(1, 0, 0), z_dir=(0, 1, 0))):
        with Locations((93.2336389, -64.560754974)):
            Rectangle(SKETCH_10_W, SKETCH_10_H)
    extrude(amount=EXTRUDE_7_DEPTH)

    # 草图11 → 凸台-拉伸8 (add)
    with BuildSketch(Plane(origin=(0, 170, 0), x_dir=(1, 0, 0), z_dir=(0, 1, 0))):
        with Locations((93.064353377, -64.621916085)):
            Rectangle(SKETCH_11_W, SKETCH_11_H)
    extrude(amount=EXTRUDE_8_DEPTH)

    # 草图12 → 凸台-拉伸9 (add)
    with BuildSketch(Plane.XY.offset(79)):
        with Locations((-1.666280354, 94.599564074)):
            Rectangle(SKETCH_12_W, SKETCH_12_H)
    extrude(amount=EXTRUDE_9_DEPTH)


solid = part.part
